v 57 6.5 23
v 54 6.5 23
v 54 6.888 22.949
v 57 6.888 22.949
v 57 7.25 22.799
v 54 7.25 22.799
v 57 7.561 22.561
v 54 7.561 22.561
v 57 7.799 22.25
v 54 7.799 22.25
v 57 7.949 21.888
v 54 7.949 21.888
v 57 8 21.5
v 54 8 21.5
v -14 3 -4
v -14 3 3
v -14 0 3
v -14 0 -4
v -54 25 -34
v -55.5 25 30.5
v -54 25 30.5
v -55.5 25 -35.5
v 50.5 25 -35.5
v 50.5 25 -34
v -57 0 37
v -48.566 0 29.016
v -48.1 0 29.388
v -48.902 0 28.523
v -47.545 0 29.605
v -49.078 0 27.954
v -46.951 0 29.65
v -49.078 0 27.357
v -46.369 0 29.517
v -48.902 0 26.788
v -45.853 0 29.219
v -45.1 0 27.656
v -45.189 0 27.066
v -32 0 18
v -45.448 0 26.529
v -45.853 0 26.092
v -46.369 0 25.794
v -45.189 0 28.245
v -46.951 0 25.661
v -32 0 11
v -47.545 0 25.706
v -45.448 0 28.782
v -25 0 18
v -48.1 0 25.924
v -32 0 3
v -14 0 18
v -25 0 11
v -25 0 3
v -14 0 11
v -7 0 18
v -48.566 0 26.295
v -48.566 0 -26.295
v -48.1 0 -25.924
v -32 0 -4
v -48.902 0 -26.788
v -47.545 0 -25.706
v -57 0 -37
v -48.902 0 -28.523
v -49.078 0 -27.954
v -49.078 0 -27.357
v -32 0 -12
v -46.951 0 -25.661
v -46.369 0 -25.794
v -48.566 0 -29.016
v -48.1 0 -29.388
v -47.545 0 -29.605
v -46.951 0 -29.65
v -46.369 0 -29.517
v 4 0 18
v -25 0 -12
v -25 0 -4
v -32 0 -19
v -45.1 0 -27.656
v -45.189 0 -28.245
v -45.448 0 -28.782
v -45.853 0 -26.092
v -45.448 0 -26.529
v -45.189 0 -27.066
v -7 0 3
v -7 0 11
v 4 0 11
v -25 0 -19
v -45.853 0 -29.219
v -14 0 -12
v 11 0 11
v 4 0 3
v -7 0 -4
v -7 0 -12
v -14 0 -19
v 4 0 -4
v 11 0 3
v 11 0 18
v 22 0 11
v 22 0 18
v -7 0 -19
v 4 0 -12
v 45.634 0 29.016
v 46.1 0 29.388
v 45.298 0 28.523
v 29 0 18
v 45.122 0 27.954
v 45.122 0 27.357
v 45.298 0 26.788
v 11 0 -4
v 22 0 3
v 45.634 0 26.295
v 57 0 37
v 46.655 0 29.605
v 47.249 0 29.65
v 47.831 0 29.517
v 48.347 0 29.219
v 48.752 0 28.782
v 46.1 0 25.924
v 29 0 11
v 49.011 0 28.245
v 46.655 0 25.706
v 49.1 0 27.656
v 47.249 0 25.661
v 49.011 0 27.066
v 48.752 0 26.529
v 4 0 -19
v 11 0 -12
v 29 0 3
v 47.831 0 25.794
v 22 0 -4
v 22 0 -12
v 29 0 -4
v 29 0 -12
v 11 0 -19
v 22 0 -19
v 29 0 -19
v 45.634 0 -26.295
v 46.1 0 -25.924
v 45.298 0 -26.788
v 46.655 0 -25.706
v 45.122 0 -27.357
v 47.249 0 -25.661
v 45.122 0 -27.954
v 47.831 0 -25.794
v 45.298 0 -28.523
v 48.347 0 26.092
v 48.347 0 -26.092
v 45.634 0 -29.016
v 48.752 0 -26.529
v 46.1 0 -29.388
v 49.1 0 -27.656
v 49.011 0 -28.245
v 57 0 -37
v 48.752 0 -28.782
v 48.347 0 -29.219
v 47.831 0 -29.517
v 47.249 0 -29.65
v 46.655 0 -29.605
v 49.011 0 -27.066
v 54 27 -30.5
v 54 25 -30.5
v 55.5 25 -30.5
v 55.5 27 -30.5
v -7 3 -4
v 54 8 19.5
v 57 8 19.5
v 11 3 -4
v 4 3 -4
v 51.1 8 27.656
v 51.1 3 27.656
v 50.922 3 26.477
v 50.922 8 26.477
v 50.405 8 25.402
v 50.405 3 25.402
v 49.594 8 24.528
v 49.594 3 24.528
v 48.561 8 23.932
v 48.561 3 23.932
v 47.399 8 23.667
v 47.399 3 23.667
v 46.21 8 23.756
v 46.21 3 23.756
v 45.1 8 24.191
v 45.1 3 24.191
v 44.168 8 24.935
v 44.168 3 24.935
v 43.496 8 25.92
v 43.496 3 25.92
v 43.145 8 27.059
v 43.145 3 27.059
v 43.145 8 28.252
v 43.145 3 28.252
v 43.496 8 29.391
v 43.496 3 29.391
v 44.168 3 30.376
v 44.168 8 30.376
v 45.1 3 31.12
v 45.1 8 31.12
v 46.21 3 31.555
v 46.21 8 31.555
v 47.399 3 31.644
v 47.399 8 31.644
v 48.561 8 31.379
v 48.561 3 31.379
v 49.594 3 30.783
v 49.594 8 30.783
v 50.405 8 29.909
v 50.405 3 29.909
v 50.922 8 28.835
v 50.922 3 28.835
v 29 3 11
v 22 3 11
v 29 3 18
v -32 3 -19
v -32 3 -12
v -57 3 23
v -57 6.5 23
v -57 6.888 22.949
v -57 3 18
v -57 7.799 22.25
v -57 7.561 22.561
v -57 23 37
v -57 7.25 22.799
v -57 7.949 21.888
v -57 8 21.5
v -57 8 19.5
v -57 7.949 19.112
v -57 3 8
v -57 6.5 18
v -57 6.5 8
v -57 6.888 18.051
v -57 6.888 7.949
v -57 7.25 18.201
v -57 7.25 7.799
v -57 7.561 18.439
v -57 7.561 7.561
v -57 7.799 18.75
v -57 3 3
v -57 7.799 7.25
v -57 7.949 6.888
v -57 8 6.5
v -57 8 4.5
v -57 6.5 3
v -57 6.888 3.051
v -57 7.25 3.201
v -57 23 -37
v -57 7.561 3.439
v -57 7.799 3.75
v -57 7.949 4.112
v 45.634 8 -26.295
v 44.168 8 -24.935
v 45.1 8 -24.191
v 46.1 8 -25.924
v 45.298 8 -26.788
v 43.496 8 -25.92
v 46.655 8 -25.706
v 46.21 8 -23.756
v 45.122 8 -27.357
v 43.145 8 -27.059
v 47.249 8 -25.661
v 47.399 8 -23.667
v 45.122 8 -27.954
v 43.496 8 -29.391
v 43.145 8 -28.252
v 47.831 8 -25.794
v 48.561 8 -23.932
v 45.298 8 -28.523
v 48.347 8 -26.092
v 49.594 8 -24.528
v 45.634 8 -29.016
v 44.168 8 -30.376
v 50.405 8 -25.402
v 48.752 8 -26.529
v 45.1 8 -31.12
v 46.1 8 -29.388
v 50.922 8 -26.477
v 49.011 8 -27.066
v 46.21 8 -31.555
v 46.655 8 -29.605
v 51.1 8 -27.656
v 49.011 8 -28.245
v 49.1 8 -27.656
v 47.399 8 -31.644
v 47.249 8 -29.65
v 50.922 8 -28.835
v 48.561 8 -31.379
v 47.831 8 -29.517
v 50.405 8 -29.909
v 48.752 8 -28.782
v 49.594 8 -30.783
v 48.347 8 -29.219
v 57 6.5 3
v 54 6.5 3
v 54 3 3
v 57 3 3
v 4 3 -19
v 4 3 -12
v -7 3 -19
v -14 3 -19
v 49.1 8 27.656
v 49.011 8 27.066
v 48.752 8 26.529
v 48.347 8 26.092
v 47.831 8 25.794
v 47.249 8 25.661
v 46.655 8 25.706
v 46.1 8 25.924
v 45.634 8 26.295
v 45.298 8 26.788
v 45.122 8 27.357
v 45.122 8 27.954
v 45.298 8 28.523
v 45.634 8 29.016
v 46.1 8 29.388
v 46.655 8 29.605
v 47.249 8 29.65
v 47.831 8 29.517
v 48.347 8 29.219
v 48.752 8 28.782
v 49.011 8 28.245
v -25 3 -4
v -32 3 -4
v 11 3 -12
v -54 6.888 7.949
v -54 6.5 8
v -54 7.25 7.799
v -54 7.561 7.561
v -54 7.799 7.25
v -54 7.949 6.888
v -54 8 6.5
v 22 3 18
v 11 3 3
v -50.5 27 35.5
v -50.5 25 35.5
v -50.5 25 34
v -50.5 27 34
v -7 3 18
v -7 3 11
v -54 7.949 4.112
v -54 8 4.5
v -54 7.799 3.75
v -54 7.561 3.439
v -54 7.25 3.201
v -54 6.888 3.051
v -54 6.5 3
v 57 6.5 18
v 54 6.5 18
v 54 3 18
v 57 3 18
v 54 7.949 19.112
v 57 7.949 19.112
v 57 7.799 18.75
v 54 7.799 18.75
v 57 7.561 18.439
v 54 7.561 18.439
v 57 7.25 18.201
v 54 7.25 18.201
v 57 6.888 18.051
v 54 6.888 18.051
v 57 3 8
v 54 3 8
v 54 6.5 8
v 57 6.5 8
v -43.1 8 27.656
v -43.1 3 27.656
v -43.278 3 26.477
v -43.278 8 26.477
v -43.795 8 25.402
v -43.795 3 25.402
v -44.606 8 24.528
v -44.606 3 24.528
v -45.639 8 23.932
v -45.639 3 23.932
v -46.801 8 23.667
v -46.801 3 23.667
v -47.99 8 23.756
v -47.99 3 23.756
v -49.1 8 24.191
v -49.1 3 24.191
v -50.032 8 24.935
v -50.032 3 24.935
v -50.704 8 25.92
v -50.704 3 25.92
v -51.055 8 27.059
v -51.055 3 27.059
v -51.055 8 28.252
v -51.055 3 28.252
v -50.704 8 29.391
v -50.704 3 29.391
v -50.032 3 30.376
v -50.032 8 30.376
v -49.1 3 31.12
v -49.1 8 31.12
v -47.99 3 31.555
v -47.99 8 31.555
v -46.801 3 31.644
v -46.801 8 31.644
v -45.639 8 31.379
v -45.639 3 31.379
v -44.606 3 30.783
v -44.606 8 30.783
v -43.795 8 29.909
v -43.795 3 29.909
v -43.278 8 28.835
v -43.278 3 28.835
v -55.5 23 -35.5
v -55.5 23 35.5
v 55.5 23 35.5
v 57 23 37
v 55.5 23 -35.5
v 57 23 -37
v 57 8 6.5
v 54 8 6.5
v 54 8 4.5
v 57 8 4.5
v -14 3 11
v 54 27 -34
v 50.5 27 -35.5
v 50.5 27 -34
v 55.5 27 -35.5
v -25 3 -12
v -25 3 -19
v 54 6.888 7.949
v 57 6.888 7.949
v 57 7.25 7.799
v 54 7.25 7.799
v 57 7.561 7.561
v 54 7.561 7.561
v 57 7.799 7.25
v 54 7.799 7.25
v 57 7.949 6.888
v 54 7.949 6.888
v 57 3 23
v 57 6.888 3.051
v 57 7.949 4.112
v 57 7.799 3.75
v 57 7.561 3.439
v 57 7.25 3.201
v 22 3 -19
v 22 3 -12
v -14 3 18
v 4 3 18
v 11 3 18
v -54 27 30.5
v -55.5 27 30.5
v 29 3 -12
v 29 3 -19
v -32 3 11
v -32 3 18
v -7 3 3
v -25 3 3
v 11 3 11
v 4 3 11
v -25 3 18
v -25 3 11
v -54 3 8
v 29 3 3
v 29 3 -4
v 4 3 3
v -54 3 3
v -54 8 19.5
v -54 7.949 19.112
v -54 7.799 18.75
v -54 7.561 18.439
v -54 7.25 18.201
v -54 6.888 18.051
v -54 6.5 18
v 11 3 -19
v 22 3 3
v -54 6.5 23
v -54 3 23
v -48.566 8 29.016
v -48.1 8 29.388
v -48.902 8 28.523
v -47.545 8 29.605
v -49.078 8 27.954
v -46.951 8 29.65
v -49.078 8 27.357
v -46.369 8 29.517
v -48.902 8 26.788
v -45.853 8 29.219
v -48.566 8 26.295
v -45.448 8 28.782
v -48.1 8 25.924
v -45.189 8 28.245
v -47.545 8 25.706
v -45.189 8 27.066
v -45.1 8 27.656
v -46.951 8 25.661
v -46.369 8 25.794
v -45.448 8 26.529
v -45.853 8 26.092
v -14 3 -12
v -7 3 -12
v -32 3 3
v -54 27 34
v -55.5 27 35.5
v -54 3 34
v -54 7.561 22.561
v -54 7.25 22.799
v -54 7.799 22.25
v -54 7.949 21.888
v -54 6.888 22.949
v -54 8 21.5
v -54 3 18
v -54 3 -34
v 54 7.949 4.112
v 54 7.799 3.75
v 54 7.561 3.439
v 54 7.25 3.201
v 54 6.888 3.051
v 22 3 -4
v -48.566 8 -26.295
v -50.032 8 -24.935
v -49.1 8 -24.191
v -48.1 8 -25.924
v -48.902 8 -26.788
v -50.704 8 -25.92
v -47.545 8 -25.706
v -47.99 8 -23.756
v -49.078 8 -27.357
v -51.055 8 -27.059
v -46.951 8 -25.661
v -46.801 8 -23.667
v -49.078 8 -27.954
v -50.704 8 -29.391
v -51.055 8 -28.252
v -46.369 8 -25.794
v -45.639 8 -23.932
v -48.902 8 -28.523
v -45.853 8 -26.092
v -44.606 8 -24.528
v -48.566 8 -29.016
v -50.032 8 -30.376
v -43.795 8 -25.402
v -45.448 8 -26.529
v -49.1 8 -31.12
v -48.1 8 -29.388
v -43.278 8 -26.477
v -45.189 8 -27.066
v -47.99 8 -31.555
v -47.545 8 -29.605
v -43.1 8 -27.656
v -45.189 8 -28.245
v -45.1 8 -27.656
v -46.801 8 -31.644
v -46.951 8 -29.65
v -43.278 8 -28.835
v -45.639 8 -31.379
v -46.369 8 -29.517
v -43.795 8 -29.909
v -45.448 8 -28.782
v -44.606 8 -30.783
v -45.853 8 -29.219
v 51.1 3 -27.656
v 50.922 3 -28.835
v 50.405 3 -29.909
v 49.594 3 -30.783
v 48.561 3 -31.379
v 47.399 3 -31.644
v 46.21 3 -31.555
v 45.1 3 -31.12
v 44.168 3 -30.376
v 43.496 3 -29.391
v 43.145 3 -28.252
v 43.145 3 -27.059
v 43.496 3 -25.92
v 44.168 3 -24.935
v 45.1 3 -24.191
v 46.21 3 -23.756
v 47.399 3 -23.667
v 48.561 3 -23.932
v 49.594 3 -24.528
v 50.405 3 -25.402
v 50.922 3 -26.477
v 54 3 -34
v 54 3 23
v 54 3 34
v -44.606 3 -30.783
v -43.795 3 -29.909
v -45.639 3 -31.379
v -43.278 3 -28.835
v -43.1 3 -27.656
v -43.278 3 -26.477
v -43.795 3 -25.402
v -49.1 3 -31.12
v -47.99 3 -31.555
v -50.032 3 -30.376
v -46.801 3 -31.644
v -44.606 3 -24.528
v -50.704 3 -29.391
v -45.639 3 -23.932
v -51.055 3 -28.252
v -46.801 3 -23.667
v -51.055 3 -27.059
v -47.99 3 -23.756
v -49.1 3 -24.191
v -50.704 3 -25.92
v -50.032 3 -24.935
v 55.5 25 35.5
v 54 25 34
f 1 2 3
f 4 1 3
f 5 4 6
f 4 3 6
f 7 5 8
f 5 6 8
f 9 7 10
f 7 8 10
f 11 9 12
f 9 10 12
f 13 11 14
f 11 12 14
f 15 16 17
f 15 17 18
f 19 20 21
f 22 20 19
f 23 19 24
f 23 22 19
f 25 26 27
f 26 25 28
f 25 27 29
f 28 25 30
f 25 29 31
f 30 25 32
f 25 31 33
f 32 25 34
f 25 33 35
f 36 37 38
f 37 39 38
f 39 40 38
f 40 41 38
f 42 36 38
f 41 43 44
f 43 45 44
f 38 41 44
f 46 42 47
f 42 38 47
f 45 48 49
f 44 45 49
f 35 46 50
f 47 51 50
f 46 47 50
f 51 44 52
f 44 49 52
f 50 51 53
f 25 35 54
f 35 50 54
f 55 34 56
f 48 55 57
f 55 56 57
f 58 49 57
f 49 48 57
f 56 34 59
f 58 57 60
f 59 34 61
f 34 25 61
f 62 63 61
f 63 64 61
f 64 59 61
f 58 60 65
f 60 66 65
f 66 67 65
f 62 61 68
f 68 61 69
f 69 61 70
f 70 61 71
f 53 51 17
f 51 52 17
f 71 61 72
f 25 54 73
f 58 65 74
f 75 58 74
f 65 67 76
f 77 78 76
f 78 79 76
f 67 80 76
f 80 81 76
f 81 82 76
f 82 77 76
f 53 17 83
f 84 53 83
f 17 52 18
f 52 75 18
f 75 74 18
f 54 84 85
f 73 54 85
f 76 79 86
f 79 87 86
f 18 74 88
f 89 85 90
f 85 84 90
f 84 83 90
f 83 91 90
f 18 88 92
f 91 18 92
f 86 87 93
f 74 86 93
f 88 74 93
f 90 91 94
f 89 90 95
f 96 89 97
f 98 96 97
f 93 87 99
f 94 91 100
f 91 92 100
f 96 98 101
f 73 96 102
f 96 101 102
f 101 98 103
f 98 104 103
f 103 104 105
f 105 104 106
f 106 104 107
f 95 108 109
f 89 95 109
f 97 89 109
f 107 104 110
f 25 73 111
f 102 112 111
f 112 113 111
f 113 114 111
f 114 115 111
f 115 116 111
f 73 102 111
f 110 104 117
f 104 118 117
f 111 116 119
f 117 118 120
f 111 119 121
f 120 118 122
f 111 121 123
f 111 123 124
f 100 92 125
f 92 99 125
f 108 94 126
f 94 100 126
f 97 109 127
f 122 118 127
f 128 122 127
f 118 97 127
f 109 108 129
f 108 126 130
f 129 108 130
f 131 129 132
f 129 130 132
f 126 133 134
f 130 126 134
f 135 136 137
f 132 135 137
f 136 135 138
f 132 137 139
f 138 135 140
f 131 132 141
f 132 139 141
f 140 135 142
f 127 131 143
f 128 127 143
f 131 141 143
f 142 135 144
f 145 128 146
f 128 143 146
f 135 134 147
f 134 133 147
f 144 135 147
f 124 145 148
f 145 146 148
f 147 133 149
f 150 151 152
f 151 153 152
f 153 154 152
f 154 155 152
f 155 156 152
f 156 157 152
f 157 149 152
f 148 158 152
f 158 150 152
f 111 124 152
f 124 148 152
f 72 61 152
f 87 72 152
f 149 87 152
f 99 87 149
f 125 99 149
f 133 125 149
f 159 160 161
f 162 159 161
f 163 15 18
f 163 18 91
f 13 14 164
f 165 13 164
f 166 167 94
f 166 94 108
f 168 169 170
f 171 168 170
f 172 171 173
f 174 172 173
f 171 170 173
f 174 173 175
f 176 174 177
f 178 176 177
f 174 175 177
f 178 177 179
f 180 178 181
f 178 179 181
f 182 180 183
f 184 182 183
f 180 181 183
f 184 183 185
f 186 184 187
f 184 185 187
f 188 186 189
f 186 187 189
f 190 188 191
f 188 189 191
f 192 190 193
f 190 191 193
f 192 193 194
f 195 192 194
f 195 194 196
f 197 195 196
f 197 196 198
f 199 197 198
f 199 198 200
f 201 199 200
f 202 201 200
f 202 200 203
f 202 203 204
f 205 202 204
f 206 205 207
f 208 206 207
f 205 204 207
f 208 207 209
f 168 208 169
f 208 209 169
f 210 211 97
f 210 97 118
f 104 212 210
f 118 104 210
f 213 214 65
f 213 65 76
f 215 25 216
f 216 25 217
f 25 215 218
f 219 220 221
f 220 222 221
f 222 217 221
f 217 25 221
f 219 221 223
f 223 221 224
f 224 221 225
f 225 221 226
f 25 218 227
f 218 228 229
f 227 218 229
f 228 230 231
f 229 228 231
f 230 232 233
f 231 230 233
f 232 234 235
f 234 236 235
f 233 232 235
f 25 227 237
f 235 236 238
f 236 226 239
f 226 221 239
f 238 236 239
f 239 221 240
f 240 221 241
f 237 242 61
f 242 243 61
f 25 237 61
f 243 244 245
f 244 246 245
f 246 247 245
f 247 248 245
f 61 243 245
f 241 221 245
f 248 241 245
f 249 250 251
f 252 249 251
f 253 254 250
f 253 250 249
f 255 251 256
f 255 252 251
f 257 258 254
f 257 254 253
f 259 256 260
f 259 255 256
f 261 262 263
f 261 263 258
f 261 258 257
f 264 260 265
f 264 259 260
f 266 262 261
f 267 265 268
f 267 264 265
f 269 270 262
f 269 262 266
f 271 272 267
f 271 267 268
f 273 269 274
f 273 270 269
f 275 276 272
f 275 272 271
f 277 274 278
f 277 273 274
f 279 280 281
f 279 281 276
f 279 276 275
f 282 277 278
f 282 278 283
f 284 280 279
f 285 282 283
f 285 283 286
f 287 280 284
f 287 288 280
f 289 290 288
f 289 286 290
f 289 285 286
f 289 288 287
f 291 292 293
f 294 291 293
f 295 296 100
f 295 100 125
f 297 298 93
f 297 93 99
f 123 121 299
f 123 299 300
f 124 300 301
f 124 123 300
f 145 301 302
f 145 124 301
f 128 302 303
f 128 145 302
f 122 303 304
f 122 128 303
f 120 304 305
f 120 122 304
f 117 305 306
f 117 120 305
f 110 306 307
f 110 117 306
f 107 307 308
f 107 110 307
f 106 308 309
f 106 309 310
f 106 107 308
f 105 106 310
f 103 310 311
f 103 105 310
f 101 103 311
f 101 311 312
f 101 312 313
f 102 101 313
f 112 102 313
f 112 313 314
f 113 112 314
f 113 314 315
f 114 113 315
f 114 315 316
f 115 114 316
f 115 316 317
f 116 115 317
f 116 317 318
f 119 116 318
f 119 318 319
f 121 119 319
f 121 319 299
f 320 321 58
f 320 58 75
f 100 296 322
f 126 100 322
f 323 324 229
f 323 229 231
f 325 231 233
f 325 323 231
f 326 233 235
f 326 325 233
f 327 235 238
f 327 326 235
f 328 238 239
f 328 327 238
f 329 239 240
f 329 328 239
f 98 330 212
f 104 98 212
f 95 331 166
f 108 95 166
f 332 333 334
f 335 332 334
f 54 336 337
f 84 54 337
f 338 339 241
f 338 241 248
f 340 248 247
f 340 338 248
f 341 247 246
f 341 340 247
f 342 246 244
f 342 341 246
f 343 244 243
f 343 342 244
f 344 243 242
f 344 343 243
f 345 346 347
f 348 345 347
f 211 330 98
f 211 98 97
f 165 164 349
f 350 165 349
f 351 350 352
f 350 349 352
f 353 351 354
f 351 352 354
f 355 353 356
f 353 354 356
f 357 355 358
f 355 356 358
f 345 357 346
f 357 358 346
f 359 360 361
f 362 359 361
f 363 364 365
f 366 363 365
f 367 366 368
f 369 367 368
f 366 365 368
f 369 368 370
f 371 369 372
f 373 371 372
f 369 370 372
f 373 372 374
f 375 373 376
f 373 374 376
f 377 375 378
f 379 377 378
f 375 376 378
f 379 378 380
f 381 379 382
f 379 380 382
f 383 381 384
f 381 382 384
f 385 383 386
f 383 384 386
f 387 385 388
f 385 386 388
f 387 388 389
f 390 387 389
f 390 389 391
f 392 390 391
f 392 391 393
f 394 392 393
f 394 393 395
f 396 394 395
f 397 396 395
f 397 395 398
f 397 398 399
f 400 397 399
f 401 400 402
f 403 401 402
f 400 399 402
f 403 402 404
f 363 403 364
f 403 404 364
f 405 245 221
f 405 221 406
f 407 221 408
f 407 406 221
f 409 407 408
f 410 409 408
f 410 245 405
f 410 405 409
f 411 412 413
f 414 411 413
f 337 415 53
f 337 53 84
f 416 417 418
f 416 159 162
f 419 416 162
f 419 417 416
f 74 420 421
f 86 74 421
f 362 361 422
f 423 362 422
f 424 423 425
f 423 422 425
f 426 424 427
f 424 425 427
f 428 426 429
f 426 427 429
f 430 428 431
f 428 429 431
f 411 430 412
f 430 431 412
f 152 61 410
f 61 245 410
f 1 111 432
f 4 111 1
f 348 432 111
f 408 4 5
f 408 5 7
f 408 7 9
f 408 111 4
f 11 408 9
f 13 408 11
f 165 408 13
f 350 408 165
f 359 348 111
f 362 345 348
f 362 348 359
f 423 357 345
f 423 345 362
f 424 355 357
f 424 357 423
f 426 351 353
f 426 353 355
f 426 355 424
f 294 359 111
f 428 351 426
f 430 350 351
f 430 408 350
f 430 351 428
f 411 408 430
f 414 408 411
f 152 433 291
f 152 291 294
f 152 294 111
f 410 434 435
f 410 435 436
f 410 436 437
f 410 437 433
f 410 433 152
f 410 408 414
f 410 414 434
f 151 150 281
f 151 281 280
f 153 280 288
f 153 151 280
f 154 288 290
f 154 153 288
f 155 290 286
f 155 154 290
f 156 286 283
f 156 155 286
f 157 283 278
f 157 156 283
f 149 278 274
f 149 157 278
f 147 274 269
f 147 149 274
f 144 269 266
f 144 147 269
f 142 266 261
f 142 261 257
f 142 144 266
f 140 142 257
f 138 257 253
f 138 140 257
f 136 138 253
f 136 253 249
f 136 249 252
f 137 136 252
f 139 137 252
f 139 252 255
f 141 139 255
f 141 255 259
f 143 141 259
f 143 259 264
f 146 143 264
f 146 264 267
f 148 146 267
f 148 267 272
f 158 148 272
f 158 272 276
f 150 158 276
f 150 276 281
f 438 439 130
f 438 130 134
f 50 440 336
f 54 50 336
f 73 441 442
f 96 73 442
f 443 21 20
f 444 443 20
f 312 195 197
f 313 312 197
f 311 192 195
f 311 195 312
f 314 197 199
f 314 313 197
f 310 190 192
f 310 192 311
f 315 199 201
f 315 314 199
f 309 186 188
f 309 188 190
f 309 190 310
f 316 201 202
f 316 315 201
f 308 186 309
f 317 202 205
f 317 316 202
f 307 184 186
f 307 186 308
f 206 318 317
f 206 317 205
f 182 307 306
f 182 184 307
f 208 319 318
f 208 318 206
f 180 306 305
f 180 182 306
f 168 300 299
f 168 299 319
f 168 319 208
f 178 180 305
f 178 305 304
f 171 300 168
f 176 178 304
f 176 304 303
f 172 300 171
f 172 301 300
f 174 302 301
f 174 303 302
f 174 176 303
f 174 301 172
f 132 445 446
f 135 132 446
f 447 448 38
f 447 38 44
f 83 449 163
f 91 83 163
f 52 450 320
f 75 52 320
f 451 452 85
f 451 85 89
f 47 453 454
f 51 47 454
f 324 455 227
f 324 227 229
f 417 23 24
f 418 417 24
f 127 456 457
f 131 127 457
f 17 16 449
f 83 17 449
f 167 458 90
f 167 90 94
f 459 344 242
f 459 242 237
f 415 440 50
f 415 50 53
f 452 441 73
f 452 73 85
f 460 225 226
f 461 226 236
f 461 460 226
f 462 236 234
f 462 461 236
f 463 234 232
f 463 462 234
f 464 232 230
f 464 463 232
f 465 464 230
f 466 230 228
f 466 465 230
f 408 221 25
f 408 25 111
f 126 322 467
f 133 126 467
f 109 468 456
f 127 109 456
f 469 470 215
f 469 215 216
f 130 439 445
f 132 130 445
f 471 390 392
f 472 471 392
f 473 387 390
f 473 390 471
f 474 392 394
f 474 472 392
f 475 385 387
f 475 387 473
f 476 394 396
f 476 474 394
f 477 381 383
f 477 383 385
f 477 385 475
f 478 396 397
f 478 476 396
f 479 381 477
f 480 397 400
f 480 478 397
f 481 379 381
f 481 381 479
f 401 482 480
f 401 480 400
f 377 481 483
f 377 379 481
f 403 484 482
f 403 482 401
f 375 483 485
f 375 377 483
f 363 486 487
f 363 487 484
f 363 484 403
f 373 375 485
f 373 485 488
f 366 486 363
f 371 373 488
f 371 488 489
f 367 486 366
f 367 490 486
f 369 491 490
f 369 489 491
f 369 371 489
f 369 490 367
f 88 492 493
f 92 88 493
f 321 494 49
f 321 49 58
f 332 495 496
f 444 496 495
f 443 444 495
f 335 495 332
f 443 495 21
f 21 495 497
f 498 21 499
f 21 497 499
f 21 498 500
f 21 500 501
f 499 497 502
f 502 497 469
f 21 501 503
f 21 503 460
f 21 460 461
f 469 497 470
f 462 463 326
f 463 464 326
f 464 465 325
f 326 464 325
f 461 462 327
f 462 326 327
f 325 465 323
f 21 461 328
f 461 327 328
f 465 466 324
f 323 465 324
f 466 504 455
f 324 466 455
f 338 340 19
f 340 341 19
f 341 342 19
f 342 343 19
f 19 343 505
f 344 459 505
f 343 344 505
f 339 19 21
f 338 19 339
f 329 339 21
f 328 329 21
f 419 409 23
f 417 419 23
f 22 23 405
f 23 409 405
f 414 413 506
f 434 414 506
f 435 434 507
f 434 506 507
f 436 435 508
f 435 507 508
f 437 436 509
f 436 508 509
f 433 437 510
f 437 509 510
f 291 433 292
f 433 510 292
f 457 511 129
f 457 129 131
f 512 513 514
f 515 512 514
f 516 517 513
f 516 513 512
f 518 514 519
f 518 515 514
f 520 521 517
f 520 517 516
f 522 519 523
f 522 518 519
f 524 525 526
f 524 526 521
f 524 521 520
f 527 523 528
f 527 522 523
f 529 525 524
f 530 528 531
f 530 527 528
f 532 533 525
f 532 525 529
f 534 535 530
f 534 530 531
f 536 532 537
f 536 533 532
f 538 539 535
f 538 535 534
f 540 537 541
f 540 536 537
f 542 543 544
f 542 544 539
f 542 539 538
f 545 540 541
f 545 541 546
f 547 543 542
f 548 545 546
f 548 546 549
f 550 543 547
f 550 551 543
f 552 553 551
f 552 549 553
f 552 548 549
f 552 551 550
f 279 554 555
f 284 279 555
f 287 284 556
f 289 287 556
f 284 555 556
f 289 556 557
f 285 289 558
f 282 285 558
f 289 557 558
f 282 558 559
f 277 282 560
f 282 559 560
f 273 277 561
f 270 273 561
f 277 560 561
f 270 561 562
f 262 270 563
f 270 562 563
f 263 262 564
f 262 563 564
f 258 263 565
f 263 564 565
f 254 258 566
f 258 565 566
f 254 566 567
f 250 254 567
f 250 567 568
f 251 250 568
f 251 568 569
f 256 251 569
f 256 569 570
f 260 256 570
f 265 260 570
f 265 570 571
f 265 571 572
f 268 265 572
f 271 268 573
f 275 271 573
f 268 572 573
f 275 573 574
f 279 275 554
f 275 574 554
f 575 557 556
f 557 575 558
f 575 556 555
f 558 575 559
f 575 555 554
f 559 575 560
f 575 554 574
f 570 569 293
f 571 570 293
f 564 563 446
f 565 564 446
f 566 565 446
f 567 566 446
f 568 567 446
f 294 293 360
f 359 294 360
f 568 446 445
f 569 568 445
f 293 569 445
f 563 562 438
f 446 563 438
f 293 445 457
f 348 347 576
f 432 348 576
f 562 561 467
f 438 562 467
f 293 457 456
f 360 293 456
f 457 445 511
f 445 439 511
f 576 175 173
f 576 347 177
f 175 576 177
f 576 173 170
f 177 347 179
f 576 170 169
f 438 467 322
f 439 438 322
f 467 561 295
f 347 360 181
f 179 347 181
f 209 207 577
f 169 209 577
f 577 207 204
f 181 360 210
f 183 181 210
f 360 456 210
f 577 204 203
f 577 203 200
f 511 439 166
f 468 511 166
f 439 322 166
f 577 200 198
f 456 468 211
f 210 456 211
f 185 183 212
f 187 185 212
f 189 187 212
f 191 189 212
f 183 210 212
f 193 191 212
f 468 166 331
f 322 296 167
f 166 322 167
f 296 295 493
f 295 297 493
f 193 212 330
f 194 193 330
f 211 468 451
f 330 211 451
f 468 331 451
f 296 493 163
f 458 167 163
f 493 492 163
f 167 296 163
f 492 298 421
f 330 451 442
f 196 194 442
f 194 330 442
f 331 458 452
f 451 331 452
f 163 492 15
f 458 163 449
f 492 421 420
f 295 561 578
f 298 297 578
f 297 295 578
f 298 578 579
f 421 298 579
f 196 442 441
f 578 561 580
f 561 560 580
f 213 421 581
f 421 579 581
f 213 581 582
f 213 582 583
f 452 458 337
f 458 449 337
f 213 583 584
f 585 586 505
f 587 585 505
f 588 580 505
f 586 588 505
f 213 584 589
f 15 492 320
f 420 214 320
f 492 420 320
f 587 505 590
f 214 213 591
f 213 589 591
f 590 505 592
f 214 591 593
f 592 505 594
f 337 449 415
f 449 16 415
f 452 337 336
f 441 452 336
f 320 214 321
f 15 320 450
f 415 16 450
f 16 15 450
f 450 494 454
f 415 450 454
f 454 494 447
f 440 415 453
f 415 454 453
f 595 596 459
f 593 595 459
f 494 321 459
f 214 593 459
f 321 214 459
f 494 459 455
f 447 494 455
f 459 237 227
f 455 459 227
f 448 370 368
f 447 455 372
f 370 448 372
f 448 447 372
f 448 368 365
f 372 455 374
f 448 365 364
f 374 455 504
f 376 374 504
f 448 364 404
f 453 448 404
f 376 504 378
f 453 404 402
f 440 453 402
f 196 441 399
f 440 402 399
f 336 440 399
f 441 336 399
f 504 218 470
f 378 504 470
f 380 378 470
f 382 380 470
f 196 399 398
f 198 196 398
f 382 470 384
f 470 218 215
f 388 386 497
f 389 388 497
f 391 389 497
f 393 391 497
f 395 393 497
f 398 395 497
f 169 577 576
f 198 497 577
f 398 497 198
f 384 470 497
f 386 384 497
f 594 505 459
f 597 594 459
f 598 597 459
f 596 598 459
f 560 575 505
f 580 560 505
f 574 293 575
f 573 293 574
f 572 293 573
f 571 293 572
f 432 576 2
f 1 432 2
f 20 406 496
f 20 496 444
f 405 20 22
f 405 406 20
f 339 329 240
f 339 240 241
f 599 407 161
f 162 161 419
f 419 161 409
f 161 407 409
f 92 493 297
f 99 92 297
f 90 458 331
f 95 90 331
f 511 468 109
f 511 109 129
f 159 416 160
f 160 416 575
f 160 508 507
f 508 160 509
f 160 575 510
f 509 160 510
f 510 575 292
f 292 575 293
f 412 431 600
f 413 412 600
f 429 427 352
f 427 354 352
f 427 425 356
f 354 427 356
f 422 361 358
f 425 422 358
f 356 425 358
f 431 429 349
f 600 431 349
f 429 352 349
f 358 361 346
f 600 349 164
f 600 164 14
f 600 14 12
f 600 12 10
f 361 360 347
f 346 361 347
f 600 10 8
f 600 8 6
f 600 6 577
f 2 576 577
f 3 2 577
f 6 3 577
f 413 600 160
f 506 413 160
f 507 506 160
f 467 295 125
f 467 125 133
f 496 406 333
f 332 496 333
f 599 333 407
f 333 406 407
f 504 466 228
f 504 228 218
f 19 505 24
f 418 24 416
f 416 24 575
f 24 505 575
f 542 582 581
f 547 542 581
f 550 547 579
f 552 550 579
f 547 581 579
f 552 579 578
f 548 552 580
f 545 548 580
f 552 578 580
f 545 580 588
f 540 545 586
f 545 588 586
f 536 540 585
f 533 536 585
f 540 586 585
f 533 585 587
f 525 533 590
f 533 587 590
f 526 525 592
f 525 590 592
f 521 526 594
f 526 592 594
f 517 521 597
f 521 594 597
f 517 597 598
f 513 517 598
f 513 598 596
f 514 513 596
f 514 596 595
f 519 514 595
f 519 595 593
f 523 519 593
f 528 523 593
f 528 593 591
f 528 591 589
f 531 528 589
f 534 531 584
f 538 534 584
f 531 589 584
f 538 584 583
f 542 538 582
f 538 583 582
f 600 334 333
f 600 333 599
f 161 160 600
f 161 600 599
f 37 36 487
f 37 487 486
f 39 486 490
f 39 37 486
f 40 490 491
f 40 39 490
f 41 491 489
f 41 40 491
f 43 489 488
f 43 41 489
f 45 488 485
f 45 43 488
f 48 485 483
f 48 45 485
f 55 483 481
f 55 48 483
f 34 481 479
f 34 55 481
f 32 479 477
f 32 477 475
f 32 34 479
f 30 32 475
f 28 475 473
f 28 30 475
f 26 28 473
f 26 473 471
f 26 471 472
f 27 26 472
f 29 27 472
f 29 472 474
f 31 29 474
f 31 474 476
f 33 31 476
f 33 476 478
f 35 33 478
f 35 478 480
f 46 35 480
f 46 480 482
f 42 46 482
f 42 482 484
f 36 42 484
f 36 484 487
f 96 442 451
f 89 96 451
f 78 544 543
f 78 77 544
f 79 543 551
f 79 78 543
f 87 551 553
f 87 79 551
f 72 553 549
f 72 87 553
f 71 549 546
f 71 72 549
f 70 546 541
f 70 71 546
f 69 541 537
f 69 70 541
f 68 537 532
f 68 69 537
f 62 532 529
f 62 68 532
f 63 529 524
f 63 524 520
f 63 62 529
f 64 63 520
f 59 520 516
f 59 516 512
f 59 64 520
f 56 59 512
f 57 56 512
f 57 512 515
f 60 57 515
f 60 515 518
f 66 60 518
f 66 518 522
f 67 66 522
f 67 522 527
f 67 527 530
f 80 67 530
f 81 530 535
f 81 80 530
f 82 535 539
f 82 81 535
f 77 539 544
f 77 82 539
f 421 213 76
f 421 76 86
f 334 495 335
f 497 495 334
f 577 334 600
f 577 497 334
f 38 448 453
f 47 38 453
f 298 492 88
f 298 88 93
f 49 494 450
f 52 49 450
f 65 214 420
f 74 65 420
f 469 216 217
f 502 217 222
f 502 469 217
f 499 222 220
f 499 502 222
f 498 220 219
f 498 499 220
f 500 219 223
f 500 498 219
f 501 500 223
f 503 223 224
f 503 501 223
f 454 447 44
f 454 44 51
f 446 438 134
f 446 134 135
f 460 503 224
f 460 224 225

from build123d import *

# Parameters (mm, degrees)
SKETCH1_W                = 108
SKETCH1_H                = 68
SKETCH1_R                = 2
BOSS_EXTRUDE1_DEPTH      = 3
SKETCH2_W                = 114
SKETCH2_H                = 74
SKETCH2_W_2              = 108
SKETCH2_H_2              = 68
BOSS_EXTRUDE2_DEPTH      = 20
BOSS_EXTRUDE2_DEPTH_BACK = 3
SKETCH4_W                = 111
SKETCH4_H                = 71
SKETCH4_W_2              = 108
SKETCH4_H_2              = 68
BOSS_EXTRUDE3_DEPTH      = 2
CUT_EXTRUDE1_DEPTH       = 4
SKETCH6_R                = 4
SKETCH6_R_2              = 2
BOSS_EXTRUDE4_DEPTH      = 5
SKETCH7_W                = 7
SKETCH7_H                = 7
CUT_EXTRUDE2_DEPTH       = 4
BOSS_EXTRUDE5_DEPTH      = 2


with BuildPart() as part:
    # Sketch1 → Boss-Extrude1 (new body)
    with BuildSketch(Plane(origin=(0, 0, 0), x_dir=(1, 0, 0), z_dir=(0, 1, 0))):
        Rectangle(SKETCH1_W, SKETCH1_H)
        with Locations((-47.1, 27.655555556)):
            Circle(SKETCH1_R, mode=Mode.SUBTRACT)
        with Locations((47.1, 27.655555556)):
            Circle(SKETCH1_R, mode=Mode.SUBTRACT)
        with Locations((47.1, -27.655555556)):
            Circle(SKETCH1_R, mode=Mode.SUBTRACT)
        with Locations((-47.1, -27.655555556)):
            Circle(SKETCH1_R, mode=Mode.SUBTRACT)
    extrude(amount=BOSS_EXTRUDE1_DEPTH)

    # Sketch2 → Boss-Extrude2 (add, two sides)
    with BuildSketch(Plane(origin=(0, 3, 0), x_dir=(1, 0, 0), z_dir=(0, 1, 0))) as boss_extrude2_sk:
        Rectangle(SKETCH2_W, SKETCH2_H)
        Rectangle(SKETCH2_W_2, SKETCH2_H_2, mode=Mode.SUBTRACT)
    extrude(amount=BOSS_EXTRUDE2_DEPTH)
    extrude(boss_extrude2_sk.sketch, amount=-BOSS_EXTRUDE2_DEPTH_BACK)

    # Sketch4 → Boss-Extrude3 (add)
    with BuildSketch(Plane(origin=(0, 23, 0), x_dir=(1, 0, 0), z_dir=(0, 1, 0))):
        Rectangle(SKETCH4_W, SKETCH4_H)
        Rectangle(SKETCH4_W_2, SKETCH4_H_2, mode=Mode.SUBTRACT)
    extrude(amount=BOSS_EXTRUDE3_DEPTH)

    # Sketch5 → Cut-Extrude1 (cut, through all)
    with BuildSketch(Plane.ZY.offset(-54)):
        with BuildLine():
            Line((3, 3), (8, 3))
            Line((8, 3), (8, 6.5))
            ThreePointArc((8, 6.5), (7.560660172, 7.560660172), (6.5, 8))
            Line((6.5, 8), (4.5, 8))
            ThreePointArc((4.5, 8), (3.439339828, 7.560660172), (3, 6.5))
            Line((3, 6.5), (3, 3))
        make_face()
        with BuildLine():
            Line((18, 3), (23, 3))
            Line((23, 3), (23, 6.5))
            ThreePointArc((23, 6.5), (22.560660172, 7.560660172), (21.5, 8))
            Line((21.5, 8), (19.5, 8))
            ThreePointArc((19.5, 8), (18.439339828, 7.560660172), (18, 6.5))
            Line((18, 6.5), (18, 3))
        make_face()
    cut_extrude1 = extrude(amount=-CUT_EXTRUDE1_DEPTH, mode=Mode.SUBTRACT)

    # Sketch6 → Boss-Extrude4 (add)
    with BuildSketch(Plane(origin=(0, 3, 0), x_dir=(1, 0, 0), z_dir=(0, 1, 0))):
        with Locations((-47.1, 27.655555556)):
            Circle(SKETCH6_R)
        with Locations((-47.1, 27.655555556)):
            Circle(SKETCH6_R_2, mode=Mode.SUBTRACT)
        with Locations((47.1, 27.655555556)):
            Circle(SKETCH6_R)
        with Locations((47.1, 27.655555556)):
            Circle(SKETCH6_R_2, mode=Mode.SUBTRACT)
        with Locations((47.1, -27.655555556)):
            Circle(SKETCH6_R)
        with Locations((47.1, -27.655555556)):
            Circle(SKETCH6_R_2, mode=Mode.SUBTRACT)
        with Locations((-47.1, -27.655555556)):
            Circle(SKETCH6_R)
        with Locations((-47.1, -27.655555556)):
            Circle(SKETCH6_R_2, mode=Mode.SUBTRACT)
    extrude(amount=BOSS_EXTRUDE4_DEPTH)

    # Sketch7 → Cut-Extrude2 (cut, through all)
    with BuildSketch(Plane(origin=(0, 3, 0), x_dir=(1, 0, 0), z_dir=(0, 1, 0))):
        with Locations((-10.5, 15.5)):
            Rectangle(SKETCH7_W, SKETCH7_H)
        with Locations((-28.5, 15.5)):
            Rectangle(SKETCH7_W, SKETCH7_H)
        with Locations((7.5, 15.5)):
            Rectangle(SKETCH7_W, SKETCH7_H)
        with Locations((25.5, 15.5)):
            Rectangle(SKETCH7_W, SKETCH7_H)
        with Locations((-10.5, 0.5)):
            Rectangle(SKETCH7_W, SKETCH7_H)
        with Locations((7.5, 0.5)):
            Rectangle(SKETCH7_W, SKETCH7_H)
        with Locations((25.5, 0.5)):
            Rectangle(SKETCH7_W, SKETCH7_H)
        with Locations((-10.5, -14.5)):
            Rectangle(SKETCH7_W, SKETCH7_H)
        with Locations((7.5, -14.5)):
            Rectangle(SKETCH7_W, SKETCH7_H)
        with Locations((25.5, -14.5)):
            Rectangle(SKETCH7_W, SKETCH7_H)
        with Locations((-28.5, 0.5)):
            Rectangle(SKETCH7_W, SKETCH7_H)
        with Locations((-28.5, -14.5)):
            Rectangle(SKETCH7_W, SKETCH7_H)
    extrude(amount=-CUT_EXTRUDE2_DEPTH, mode=Mode.SUBTRACT)

    # Mirror1: Cut-Extrude1 across plane
    add(cut_extrude1.mirror(Plane(origin=(0, 0, 0), x_dir=(0, 0, 1), z_dir=(1, 0, 0))), mode=Mode.SUBTRACT)

    # Sketch8 → Boss-Extrude5 (add)
    with BuildSketch(Plane(origin=(0, 25, 0), x_dir=(1, 0, 0), z_dir=(0, 1, 0))):
        Polygon((55.5, 35.5), (50.5, 35.5), (50.5, 34), (54, 34), (54, 30.5), (55.5, 30.5), align=None)
        Polygon((-55.5, -35.5), (-50.5, -35.5), (-50.5, -34), (-54, -34), (-54, -30.5), (-55.5, -30.5), align=None)
    extrude(amount=BOSS_EXTRUDE5_DEPTH)


solid = part.part
